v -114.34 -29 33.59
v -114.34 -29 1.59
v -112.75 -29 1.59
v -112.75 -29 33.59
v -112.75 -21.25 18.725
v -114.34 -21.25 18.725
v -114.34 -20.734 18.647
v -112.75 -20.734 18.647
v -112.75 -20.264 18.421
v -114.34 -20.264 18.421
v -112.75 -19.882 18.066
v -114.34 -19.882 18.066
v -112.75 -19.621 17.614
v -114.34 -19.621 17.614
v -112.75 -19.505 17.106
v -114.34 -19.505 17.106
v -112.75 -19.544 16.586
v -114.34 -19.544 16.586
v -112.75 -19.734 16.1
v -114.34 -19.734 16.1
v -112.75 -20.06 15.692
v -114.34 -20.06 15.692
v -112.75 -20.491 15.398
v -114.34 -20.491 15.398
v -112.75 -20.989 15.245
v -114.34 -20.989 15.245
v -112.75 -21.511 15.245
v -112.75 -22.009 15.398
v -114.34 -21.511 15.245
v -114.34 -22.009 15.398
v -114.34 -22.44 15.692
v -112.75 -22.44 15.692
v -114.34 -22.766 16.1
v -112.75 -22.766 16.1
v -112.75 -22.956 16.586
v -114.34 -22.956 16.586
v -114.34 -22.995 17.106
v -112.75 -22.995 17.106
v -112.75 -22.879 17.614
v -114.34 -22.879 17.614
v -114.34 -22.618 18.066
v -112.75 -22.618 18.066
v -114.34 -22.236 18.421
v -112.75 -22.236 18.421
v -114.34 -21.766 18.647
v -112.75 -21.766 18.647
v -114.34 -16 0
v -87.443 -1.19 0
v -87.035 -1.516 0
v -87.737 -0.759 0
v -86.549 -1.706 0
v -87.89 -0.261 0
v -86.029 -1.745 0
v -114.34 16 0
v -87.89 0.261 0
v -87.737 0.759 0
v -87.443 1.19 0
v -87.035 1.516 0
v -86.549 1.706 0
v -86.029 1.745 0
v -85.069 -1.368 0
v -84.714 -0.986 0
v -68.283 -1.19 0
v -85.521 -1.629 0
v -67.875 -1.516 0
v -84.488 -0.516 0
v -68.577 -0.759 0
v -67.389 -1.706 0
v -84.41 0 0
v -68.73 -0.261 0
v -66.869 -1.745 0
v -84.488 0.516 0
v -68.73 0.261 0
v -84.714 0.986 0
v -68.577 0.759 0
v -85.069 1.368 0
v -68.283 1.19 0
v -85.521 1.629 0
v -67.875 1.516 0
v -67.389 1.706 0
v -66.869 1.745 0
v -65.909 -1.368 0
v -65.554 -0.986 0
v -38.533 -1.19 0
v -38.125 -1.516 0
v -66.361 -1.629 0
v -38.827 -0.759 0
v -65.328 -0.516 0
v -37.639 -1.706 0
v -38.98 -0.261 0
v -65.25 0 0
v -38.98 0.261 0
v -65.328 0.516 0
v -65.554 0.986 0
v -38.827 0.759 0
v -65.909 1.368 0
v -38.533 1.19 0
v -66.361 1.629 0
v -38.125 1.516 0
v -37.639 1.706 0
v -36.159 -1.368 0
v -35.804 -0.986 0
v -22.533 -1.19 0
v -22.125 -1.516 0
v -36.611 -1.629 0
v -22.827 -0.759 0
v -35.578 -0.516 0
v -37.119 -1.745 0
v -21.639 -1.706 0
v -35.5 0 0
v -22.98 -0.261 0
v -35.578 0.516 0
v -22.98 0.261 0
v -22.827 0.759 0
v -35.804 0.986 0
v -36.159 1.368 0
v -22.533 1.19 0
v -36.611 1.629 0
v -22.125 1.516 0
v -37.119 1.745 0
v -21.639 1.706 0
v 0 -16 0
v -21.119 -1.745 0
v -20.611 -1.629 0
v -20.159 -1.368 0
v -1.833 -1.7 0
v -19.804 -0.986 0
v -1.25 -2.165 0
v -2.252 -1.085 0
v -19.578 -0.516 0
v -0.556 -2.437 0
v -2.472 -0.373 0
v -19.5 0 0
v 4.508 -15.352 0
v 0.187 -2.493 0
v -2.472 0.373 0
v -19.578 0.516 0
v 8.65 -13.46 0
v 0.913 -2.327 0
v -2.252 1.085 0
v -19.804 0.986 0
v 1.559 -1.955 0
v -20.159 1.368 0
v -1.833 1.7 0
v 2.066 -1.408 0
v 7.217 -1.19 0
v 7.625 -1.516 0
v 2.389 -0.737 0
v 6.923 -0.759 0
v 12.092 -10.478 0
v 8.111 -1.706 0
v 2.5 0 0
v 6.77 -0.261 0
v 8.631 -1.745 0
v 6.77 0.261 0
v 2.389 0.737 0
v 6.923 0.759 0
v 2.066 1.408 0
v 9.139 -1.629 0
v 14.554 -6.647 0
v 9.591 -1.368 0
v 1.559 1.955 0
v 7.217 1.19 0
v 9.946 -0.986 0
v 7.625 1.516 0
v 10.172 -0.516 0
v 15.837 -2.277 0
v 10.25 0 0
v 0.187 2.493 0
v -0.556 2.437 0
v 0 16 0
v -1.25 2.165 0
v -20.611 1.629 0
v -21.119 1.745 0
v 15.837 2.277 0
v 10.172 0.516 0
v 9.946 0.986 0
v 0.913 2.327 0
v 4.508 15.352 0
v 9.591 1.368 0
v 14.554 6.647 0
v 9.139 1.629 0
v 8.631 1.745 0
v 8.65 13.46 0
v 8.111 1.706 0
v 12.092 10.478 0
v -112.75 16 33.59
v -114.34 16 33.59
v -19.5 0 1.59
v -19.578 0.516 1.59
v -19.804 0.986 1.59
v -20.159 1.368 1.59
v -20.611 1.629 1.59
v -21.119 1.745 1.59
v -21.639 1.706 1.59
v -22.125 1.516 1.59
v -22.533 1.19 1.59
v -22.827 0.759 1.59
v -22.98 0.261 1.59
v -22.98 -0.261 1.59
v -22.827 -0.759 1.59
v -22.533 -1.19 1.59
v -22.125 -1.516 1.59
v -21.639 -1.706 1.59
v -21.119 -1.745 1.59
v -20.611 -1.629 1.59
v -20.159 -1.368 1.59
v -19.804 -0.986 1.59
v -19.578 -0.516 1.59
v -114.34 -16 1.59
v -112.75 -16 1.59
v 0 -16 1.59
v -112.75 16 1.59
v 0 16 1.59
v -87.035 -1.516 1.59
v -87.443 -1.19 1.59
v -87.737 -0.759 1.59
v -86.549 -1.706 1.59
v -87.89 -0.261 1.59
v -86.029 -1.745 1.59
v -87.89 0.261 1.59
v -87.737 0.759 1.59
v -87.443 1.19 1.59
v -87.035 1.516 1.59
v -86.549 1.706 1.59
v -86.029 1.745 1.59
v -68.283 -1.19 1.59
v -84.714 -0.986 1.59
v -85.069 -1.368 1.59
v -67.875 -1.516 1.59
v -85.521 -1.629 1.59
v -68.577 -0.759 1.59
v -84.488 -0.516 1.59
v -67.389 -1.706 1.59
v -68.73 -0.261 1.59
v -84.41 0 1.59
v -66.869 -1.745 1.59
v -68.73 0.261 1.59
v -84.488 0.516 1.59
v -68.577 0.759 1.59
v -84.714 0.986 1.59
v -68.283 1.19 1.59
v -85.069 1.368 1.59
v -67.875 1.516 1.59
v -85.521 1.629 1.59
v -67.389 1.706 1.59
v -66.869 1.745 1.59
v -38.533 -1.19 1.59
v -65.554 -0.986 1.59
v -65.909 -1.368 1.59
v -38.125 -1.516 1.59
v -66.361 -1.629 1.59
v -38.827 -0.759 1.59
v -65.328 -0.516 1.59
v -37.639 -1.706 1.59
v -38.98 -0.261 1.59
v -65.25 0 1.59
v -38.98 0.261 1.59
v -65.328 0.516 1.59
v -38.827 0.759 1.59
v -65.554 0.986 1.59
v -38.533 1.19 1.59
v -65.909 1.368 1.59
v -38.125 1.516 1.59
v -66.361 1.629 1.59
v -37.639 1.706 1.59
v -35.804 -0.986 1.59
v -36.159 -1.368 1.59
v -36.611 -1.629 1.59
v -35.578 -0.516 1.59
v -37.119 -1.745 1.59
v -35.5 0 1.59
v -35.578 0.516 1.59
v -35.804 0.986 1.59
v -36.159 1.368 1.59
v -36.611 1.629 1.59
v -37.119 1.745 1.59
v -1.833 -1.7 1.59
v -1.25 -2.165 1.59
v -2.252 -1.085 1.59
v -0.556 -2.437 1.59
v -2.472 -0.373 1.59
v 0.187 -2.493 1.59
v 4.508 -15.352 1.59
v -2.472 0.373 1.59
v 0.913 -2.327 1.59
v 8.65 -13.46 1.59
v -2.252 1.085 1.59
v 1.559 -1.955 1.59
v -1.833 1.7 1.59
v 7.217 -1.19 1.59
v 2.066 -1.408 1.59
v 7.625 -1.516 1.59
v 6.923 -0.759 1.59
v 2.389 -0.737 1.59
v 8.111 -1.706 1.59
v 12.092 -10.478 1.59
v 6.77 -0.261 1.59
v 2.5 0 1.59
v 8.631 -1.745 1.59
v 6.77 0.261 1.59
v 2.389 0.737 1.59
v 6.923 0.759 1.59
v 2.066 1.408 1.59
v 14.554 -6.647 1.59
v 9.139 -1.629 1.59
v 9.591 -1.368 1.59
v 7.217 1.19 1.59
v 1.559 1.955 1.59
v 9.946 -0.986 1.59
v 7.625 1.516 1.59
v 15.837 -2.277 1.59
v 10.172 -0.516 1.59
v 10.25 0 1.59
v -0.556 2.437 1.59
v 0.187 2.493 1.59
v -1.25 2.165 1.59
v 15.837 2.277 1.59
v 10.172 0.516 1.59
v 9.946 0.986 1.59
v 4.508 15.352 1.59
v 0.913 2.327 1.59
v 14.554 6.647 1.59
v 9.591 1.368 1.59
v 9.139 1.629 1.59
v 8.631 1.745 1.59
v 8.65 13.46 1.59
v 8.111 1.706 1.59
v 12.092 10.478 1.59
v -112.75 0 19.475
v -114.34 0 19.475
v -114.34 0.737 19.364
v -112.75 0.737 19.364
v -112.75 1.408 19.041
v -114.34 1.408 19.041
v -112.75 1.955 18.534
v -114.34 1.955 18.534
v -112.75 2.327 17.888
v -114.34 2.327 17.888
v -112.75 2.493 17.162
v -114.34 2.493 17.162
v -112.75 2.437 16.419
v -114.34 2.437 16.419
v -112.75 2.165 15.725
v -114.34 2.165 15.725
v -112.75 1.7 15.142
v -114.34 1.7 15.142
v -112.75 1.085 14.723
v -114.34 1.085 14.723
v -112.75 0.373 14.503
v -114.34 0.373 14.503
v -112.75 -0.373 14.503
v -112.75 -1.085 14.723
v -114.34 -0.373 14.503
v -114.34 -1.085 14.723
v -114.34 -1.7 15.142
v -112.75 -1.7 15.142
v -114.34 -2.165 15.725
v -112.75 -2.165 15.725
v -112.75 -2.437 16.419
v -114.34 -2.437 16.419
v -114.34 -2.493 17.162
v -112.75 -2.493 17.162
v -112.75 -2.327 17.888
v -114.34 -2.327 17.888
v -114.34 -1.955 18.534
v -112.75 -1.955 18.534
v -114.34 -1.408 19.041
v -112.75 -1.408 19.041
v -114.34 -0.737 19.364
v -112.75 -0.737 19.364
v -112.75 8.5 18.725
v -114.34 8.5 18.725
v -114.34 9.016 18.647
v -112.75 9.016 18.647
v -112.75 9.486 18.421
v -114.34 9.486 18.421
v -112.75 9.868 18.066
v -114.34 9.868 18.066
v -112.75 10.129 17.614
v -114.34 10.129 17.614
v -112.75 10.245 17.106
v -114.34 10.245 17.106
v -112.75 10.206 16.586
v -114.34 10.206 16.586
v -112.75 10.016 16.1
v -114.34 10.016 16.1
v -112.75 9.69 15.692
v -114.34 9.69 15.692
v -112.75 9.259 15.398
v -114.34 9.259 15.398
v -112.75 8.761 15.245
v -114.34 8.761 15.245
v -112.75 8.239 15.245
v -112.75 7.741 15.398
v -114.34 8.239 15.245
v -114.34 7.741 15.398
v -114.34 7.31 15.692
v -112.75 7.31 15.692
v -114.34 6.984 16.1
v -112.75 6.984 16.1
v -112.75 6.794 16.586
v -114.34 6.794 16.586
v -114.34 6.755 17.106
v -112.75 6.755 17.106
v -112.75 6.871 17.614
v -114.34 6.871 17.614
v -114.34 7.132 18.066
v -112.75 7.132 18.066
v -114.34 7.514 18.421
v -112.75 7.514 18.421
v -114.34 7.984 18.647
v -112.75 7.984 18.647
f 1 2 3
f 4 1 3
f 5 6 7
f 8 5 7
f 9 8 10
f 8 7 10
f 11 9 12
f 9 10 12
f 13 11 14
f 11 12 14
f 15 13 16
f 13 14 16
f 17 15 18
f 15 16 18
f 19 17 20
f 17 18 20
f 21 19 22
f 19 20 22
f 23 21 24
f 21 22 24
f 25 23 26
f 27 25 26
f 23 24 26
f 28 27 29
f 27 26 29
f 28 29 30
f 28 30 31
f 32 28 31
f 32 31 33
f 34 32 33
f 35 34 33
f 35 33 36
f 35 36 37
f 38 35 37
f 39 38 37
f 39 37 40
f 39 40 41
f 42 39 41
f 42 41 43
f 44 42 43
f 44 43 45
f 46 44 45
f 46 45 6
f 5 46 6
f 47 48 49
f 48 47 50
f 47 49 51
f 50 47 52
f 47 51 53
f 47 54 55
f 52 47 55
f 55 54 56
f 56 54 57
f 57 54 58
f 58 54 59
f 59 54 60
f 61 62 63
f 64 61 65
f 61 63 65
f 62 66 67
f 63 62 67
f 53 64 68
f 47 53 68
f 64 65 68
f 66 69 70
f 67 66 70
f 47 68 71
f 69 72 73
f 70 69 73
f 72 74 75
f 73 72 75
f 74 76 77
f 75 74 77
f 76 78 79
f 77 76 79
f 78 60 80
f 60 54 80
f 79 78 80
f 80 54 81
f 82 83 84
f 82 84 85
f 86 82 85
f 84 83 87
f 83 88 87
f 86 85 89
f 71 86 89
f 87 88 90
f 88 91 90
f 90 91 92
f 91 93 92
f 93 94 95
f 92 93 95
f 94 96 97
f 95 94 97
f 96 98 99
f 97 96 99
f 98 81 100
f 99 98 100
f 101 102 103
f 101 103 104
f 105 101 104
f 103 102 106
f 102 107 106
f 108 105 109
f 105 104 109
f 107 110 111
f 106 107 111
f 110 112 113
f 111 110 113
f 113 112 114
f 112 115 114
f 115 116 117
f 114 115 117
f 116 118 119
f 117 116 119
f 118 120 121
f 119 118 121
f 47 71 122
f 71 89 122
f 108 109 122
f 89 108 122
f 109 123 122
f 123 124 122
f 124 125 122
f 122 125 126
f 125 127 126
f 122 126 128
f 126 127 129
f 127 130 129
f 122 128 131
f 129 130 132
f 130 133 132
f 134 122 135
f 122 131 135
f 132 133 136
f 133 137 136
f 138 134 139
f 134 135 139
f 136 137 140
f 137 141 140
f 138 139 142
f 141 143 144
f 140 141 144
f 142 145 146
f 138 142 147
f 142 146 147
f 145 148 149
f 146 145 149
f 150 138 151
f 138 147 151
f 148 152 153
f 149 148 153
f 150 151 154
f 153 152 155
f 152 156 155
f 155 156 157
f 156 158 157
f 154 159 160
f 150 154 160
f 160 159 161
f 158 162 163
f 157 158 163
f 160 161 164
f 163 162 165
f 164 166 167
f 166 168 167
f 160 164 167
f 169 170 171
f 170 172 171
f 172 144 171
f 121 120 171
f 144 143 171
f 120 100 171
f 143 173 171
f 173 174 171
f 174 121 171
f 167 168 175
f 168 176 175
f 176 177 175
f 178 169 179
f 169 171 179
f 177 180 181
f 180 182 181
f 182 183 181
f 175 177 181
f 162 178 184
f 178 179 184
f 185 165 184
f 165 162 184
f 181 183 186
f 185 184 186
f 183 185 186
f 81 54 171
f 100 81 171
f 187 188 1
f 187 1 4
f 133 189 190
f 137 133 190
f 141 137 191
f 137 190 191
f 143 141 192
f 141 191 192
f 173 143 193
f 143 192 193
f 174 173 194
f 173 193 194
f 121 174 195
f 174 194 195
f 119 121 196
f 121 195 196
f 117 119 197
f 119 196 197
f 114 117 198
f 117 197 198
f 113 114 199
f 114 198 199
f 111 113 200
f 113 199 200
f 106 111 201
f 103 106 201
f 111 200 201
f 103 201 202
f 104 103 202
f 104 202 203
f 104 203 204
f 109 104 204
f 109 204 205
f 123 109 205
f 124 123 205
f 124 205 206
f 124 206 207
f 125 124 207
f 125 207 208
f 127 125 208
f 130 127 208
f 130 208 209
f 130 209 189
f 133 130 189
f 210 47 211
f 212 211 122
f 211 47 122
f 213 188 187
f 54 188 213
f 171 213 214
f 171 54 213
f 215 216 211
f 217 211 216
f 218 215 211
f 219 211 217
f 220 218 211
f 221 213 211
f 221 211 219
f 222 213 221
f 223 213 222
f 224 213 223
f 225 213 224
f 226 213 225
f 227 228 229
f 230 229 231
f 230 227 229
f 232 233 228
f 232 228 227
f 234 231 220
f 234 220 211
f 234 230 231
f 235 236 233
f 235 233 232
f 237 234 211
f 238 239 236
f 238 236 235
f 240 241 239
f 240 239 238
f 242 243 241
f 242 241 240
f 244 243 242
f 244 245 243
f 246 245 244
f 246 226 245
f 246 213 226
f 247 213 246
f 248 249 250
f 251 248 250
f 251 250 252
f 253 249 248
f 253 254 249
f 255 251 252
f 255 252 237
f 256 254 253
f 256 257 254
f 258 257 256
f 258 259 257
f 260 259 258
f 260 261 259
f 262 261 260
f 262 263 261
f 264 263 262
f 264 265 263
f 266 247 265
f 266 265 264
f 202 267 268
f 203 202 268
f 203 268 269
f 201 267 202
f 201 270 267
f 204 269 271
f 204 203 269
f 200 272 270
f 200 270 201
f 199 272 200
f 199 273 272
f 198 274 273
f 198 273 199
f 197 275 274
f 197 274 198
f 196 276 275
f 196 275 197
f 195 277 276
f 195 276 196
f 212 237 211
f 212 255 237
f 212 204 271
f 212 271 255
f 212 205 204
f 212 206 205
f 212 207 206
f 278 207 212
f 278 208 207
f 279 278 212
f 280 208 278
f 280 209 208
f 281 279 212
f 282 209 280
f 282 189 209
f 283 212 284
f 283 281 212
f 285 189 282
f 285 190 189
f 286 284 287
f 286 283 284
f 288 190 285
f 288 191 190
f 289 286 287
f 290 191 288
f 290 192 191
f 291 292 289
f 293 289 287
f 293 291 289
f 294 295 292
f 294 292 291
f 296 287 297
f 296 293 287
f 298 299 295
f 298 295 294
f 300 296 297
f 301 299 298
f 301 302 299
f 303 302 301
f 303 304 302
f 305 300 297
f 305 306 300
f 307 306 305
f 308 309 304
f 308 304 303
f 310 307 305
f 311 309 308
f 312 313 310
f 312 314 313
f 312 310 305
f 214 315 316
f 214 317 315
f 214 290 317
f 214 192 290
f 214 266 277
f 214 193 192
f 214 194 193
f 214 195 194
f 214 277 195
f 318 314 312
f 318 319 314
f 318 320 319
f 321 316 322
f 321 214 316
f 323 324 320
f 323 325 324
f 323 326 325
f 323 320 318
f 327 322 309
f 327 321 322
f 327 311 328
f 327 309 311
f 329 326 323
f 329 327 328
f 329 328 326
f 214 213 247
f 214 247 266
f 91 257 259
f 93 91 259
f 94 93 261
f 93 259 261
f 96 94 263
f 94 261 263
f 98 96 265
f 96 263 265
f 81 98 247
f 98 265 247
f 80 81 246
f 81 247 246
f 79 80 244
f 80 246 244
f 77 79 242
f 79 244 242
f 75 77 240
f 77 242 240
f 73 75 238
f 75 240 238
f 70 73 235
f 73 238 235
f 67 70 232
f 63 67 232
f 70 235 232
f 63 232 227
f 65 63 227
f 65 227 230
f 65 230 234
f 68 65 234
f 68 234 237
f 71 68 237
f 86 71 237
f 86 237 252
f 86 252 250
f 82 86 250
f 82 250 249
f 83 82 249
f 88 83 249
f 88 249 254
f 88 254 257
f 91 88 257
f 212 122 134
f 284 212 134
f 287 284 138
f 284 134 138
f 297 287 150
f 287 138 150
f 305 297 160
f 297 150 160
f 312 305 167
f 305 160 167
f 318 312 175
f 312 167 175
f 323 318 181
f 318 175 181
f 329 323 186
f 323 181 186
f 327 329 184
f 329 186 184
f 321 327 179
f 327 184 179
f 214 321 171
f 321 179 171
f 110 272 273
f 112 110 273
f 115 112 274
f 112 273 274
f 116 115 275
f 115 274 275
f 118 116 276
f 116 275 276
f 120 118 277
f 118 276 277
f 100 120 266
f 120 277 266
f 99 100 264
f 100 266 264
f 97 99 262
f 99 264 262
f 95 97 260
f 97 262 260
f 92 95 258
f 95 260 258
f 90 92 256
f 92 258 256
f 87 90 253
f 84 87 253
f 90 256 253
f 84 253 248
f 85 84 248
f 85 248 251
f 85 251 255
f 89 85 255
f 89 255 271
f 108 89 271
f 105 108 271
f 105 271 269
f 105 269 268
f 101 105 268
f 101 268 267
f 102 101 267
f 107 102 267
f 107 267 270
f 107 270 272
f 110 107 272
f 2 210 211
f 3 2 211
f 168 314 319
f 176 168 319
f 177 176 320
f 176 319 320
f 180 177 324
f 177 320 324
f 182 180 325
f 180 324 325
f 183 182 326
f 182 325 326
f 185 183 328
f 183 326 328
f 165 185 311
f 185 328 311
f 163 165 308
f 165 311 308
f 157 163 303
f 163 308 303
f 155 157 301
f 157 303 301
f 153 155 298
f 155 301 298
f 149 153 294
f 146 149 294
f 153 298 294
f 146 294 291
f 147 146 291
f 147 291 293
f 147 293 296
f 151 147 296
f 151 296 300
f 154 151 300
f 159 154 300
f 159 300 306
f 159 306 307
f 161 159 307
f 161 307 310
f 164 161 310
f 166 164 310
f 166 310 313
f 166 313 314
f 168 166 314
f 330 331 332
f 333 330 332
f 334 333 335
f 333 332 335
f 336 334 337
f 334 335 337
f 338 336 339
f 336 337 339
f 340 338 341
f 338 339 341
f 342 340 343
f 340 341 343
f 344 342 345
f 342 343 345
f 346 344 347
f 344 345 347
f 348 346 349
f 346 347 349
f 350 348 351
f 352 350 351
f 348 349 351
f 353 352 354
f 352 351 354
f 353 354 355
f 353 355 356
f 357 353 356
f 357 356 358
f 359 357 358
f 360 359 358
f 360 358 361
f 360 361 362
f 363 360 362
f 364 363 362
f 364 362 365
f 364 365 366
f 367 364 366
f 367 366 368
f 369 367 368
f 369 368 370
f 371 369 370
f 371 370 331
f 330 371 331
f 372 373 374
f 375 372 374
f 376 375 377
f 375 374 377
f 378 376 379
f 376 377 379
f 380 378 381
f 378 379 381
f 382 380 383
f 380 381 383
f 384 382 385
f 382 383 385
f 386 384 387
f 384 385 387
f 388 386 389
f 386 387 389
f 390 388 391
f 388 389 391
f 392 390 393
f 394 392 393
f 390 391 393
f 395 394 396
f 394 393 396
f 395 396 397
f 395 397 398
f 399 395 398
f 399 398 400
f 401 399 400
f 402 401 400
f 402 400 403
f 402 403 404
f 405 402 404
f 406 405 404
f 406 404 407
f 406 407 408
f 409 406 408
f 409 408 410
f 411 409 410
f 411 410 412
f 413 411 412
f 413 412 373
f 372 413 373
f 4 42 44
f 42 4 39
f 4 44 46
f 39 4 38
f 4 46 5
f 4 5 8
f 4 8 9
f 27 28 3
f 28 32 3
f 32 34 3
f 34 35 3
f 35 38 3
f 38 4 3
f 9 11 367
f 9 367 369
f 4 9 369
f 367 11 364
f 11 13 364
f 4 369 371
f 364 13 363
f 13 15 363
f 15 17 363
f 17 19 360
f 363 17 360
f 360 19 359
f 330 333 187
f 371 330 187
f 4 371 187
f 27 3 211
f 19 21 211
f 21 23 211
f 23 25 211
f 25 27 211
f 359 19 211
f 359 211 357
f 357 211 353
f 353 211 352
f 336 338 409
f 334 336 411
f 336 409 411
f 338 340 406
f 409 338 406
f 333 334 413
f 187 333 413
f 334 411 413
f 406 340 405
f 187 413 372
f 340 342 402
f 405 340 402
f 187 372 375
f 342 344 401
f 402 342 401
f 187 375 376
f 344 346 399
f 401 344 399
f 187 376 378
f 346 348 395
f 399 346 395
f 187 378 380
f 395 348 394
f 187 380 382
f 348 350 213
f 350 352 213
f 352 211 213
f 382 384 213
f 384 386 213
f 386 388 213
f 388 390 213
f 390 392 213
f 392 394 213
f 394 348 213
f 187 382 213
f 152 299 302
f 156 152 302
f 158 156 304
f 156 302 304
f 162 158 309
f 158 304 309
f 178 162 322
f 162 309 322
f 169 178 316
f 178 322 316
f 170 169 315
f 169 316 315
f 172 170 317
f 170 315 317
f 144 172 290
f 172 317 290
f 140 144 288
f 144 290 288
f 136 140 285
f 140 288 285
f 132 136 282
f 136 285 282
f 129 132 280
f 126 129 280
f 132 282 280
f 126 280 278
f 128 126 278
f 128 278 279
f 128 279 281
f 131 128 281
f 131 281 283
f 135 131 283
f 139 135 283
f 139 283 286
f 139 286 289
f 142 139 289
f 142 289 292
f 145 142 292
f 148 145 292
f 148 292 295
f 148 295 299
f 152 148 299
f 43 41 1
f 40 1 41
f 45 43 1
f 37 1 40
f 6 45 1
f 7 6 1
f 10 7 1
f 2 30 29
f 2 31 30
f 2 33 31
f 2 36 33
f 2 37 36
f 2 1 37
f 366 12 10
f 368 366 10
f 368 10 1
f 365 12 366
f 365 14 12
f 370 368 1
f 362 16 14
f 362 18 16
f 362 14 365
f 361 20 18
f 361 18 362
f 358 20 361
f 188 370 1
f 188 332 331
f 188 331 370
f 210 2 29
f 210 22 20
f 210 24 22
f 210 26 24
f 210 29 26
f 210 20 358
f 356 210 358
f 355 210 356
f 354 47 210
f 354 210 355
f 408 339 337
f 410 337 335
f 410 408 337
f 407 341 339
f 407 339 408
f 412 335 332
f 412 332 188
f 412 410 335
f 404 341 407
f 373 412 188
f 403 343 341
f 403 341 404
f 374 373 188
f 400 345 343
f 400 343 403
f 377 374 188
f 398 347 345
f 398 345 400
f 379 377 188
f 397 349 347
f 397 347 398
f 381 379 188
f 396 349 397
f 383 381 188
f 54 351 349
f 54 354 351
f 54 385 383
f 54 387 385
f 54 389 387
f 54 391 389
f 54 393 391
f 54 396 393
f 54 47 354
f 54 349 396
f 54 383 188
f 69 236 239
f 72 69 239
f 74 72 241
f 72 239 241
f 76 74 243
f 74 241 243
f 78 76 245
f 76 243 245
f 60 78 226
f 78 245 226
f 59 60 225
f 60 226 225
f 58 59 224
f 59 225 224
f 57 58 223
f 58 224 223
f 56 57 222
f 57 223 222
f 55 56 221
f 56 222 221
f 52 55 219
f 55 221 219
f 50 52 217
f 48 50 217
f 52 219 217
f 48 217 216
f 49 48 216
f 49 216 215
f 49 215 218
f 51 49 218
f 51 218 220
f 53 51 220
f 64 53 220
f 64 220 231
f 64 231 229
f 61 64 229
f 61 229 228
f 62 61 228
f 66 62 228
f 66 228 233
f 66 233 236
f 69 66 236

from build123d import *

# Parameters (mm, degrees)
BOSS_EXTRUDE1_DEPTH = 1.59
SKETCH2_W           = 1.59
SKETCH2_H           = 45
BOSS_EXTRUDE2_DEPTH = 32
SKETCH3_R           = 2.5
SKETCH3_R_2         = 1.75
CUT_EXTRUDE1_DEPTH  = 123.223711284
SKETCH4_R           = 2.5
SKETCH4_R_2         = 1.75
CUT_EXTRUDE2_DEPTH  = 138.687340377


with BuildPart() as part:
    # Sketch1 → Boss-Extrude1 (new body)
    with BuildSketch(Plane.XY):
        with BuildLine():
            Line((0, 16), (-114.34, 16))
            Line((-114.34, 16), (-114.34, -16))
            Line((-114.34, -16), (0, -16))
            ThreePointArc((0, -16), (16, 0), (0, 16))
        make_face()
    extrude(amount=BOSS_EXTRUDE1_DEPTH)

    # Sketch2 → Boss-Extrude2 (add)
    with BuildSketch(Plane.XY.offset(1.59)):
        with Locations((-113.545, -6.5)):
            Rectangle(SKETCH2_W, SKETCH2_H)
    extrude(amount=BOSS_EXTRUDE2_DEPTH)

    # Sketch3 → Cut-Extrude1 (cut, through all)
    with BuildSketch(Plane.XY.offset(1.59)):
        Circle(SKETCH3_R)
        with Locations((8.5, 0)):
            Circle(SKETCH3_R_2)
        with Locations((-21.25, 0)):
            Circle(SKETCH3_R_2)
        with Locations((-37.25, 0)):
            Circle(SKETCH3_R_2)
        with Locations((-67, 0)):
            Circle(SKETCH3_R_2)
        with Locations((-86.16, 0)):
            Circle(SKETCH3_R_2)
    extrude(amount=-CUT_EXTRUDE1_DEPTH, mode=Mode.SUBTRACT)

    # Sketch4 → Cut-Extrude2 (cut, through all)
    with BuildSketch(Plane.ZY.offset(114.34)):
        with Locations((16.975, 0)):
            Circle(SKETCH4_R)
        with Locations((16.975, 8.5)):
            Circle(SKETCH4_R_2)
        with Locations((16.975, -21.25)):
            Circle(SKETCH4_R_2)
    extrude(amount=-CUT_EXTRUDE2_DEPTH, mode=Mode.SUBTRACT)


solid = part.part
